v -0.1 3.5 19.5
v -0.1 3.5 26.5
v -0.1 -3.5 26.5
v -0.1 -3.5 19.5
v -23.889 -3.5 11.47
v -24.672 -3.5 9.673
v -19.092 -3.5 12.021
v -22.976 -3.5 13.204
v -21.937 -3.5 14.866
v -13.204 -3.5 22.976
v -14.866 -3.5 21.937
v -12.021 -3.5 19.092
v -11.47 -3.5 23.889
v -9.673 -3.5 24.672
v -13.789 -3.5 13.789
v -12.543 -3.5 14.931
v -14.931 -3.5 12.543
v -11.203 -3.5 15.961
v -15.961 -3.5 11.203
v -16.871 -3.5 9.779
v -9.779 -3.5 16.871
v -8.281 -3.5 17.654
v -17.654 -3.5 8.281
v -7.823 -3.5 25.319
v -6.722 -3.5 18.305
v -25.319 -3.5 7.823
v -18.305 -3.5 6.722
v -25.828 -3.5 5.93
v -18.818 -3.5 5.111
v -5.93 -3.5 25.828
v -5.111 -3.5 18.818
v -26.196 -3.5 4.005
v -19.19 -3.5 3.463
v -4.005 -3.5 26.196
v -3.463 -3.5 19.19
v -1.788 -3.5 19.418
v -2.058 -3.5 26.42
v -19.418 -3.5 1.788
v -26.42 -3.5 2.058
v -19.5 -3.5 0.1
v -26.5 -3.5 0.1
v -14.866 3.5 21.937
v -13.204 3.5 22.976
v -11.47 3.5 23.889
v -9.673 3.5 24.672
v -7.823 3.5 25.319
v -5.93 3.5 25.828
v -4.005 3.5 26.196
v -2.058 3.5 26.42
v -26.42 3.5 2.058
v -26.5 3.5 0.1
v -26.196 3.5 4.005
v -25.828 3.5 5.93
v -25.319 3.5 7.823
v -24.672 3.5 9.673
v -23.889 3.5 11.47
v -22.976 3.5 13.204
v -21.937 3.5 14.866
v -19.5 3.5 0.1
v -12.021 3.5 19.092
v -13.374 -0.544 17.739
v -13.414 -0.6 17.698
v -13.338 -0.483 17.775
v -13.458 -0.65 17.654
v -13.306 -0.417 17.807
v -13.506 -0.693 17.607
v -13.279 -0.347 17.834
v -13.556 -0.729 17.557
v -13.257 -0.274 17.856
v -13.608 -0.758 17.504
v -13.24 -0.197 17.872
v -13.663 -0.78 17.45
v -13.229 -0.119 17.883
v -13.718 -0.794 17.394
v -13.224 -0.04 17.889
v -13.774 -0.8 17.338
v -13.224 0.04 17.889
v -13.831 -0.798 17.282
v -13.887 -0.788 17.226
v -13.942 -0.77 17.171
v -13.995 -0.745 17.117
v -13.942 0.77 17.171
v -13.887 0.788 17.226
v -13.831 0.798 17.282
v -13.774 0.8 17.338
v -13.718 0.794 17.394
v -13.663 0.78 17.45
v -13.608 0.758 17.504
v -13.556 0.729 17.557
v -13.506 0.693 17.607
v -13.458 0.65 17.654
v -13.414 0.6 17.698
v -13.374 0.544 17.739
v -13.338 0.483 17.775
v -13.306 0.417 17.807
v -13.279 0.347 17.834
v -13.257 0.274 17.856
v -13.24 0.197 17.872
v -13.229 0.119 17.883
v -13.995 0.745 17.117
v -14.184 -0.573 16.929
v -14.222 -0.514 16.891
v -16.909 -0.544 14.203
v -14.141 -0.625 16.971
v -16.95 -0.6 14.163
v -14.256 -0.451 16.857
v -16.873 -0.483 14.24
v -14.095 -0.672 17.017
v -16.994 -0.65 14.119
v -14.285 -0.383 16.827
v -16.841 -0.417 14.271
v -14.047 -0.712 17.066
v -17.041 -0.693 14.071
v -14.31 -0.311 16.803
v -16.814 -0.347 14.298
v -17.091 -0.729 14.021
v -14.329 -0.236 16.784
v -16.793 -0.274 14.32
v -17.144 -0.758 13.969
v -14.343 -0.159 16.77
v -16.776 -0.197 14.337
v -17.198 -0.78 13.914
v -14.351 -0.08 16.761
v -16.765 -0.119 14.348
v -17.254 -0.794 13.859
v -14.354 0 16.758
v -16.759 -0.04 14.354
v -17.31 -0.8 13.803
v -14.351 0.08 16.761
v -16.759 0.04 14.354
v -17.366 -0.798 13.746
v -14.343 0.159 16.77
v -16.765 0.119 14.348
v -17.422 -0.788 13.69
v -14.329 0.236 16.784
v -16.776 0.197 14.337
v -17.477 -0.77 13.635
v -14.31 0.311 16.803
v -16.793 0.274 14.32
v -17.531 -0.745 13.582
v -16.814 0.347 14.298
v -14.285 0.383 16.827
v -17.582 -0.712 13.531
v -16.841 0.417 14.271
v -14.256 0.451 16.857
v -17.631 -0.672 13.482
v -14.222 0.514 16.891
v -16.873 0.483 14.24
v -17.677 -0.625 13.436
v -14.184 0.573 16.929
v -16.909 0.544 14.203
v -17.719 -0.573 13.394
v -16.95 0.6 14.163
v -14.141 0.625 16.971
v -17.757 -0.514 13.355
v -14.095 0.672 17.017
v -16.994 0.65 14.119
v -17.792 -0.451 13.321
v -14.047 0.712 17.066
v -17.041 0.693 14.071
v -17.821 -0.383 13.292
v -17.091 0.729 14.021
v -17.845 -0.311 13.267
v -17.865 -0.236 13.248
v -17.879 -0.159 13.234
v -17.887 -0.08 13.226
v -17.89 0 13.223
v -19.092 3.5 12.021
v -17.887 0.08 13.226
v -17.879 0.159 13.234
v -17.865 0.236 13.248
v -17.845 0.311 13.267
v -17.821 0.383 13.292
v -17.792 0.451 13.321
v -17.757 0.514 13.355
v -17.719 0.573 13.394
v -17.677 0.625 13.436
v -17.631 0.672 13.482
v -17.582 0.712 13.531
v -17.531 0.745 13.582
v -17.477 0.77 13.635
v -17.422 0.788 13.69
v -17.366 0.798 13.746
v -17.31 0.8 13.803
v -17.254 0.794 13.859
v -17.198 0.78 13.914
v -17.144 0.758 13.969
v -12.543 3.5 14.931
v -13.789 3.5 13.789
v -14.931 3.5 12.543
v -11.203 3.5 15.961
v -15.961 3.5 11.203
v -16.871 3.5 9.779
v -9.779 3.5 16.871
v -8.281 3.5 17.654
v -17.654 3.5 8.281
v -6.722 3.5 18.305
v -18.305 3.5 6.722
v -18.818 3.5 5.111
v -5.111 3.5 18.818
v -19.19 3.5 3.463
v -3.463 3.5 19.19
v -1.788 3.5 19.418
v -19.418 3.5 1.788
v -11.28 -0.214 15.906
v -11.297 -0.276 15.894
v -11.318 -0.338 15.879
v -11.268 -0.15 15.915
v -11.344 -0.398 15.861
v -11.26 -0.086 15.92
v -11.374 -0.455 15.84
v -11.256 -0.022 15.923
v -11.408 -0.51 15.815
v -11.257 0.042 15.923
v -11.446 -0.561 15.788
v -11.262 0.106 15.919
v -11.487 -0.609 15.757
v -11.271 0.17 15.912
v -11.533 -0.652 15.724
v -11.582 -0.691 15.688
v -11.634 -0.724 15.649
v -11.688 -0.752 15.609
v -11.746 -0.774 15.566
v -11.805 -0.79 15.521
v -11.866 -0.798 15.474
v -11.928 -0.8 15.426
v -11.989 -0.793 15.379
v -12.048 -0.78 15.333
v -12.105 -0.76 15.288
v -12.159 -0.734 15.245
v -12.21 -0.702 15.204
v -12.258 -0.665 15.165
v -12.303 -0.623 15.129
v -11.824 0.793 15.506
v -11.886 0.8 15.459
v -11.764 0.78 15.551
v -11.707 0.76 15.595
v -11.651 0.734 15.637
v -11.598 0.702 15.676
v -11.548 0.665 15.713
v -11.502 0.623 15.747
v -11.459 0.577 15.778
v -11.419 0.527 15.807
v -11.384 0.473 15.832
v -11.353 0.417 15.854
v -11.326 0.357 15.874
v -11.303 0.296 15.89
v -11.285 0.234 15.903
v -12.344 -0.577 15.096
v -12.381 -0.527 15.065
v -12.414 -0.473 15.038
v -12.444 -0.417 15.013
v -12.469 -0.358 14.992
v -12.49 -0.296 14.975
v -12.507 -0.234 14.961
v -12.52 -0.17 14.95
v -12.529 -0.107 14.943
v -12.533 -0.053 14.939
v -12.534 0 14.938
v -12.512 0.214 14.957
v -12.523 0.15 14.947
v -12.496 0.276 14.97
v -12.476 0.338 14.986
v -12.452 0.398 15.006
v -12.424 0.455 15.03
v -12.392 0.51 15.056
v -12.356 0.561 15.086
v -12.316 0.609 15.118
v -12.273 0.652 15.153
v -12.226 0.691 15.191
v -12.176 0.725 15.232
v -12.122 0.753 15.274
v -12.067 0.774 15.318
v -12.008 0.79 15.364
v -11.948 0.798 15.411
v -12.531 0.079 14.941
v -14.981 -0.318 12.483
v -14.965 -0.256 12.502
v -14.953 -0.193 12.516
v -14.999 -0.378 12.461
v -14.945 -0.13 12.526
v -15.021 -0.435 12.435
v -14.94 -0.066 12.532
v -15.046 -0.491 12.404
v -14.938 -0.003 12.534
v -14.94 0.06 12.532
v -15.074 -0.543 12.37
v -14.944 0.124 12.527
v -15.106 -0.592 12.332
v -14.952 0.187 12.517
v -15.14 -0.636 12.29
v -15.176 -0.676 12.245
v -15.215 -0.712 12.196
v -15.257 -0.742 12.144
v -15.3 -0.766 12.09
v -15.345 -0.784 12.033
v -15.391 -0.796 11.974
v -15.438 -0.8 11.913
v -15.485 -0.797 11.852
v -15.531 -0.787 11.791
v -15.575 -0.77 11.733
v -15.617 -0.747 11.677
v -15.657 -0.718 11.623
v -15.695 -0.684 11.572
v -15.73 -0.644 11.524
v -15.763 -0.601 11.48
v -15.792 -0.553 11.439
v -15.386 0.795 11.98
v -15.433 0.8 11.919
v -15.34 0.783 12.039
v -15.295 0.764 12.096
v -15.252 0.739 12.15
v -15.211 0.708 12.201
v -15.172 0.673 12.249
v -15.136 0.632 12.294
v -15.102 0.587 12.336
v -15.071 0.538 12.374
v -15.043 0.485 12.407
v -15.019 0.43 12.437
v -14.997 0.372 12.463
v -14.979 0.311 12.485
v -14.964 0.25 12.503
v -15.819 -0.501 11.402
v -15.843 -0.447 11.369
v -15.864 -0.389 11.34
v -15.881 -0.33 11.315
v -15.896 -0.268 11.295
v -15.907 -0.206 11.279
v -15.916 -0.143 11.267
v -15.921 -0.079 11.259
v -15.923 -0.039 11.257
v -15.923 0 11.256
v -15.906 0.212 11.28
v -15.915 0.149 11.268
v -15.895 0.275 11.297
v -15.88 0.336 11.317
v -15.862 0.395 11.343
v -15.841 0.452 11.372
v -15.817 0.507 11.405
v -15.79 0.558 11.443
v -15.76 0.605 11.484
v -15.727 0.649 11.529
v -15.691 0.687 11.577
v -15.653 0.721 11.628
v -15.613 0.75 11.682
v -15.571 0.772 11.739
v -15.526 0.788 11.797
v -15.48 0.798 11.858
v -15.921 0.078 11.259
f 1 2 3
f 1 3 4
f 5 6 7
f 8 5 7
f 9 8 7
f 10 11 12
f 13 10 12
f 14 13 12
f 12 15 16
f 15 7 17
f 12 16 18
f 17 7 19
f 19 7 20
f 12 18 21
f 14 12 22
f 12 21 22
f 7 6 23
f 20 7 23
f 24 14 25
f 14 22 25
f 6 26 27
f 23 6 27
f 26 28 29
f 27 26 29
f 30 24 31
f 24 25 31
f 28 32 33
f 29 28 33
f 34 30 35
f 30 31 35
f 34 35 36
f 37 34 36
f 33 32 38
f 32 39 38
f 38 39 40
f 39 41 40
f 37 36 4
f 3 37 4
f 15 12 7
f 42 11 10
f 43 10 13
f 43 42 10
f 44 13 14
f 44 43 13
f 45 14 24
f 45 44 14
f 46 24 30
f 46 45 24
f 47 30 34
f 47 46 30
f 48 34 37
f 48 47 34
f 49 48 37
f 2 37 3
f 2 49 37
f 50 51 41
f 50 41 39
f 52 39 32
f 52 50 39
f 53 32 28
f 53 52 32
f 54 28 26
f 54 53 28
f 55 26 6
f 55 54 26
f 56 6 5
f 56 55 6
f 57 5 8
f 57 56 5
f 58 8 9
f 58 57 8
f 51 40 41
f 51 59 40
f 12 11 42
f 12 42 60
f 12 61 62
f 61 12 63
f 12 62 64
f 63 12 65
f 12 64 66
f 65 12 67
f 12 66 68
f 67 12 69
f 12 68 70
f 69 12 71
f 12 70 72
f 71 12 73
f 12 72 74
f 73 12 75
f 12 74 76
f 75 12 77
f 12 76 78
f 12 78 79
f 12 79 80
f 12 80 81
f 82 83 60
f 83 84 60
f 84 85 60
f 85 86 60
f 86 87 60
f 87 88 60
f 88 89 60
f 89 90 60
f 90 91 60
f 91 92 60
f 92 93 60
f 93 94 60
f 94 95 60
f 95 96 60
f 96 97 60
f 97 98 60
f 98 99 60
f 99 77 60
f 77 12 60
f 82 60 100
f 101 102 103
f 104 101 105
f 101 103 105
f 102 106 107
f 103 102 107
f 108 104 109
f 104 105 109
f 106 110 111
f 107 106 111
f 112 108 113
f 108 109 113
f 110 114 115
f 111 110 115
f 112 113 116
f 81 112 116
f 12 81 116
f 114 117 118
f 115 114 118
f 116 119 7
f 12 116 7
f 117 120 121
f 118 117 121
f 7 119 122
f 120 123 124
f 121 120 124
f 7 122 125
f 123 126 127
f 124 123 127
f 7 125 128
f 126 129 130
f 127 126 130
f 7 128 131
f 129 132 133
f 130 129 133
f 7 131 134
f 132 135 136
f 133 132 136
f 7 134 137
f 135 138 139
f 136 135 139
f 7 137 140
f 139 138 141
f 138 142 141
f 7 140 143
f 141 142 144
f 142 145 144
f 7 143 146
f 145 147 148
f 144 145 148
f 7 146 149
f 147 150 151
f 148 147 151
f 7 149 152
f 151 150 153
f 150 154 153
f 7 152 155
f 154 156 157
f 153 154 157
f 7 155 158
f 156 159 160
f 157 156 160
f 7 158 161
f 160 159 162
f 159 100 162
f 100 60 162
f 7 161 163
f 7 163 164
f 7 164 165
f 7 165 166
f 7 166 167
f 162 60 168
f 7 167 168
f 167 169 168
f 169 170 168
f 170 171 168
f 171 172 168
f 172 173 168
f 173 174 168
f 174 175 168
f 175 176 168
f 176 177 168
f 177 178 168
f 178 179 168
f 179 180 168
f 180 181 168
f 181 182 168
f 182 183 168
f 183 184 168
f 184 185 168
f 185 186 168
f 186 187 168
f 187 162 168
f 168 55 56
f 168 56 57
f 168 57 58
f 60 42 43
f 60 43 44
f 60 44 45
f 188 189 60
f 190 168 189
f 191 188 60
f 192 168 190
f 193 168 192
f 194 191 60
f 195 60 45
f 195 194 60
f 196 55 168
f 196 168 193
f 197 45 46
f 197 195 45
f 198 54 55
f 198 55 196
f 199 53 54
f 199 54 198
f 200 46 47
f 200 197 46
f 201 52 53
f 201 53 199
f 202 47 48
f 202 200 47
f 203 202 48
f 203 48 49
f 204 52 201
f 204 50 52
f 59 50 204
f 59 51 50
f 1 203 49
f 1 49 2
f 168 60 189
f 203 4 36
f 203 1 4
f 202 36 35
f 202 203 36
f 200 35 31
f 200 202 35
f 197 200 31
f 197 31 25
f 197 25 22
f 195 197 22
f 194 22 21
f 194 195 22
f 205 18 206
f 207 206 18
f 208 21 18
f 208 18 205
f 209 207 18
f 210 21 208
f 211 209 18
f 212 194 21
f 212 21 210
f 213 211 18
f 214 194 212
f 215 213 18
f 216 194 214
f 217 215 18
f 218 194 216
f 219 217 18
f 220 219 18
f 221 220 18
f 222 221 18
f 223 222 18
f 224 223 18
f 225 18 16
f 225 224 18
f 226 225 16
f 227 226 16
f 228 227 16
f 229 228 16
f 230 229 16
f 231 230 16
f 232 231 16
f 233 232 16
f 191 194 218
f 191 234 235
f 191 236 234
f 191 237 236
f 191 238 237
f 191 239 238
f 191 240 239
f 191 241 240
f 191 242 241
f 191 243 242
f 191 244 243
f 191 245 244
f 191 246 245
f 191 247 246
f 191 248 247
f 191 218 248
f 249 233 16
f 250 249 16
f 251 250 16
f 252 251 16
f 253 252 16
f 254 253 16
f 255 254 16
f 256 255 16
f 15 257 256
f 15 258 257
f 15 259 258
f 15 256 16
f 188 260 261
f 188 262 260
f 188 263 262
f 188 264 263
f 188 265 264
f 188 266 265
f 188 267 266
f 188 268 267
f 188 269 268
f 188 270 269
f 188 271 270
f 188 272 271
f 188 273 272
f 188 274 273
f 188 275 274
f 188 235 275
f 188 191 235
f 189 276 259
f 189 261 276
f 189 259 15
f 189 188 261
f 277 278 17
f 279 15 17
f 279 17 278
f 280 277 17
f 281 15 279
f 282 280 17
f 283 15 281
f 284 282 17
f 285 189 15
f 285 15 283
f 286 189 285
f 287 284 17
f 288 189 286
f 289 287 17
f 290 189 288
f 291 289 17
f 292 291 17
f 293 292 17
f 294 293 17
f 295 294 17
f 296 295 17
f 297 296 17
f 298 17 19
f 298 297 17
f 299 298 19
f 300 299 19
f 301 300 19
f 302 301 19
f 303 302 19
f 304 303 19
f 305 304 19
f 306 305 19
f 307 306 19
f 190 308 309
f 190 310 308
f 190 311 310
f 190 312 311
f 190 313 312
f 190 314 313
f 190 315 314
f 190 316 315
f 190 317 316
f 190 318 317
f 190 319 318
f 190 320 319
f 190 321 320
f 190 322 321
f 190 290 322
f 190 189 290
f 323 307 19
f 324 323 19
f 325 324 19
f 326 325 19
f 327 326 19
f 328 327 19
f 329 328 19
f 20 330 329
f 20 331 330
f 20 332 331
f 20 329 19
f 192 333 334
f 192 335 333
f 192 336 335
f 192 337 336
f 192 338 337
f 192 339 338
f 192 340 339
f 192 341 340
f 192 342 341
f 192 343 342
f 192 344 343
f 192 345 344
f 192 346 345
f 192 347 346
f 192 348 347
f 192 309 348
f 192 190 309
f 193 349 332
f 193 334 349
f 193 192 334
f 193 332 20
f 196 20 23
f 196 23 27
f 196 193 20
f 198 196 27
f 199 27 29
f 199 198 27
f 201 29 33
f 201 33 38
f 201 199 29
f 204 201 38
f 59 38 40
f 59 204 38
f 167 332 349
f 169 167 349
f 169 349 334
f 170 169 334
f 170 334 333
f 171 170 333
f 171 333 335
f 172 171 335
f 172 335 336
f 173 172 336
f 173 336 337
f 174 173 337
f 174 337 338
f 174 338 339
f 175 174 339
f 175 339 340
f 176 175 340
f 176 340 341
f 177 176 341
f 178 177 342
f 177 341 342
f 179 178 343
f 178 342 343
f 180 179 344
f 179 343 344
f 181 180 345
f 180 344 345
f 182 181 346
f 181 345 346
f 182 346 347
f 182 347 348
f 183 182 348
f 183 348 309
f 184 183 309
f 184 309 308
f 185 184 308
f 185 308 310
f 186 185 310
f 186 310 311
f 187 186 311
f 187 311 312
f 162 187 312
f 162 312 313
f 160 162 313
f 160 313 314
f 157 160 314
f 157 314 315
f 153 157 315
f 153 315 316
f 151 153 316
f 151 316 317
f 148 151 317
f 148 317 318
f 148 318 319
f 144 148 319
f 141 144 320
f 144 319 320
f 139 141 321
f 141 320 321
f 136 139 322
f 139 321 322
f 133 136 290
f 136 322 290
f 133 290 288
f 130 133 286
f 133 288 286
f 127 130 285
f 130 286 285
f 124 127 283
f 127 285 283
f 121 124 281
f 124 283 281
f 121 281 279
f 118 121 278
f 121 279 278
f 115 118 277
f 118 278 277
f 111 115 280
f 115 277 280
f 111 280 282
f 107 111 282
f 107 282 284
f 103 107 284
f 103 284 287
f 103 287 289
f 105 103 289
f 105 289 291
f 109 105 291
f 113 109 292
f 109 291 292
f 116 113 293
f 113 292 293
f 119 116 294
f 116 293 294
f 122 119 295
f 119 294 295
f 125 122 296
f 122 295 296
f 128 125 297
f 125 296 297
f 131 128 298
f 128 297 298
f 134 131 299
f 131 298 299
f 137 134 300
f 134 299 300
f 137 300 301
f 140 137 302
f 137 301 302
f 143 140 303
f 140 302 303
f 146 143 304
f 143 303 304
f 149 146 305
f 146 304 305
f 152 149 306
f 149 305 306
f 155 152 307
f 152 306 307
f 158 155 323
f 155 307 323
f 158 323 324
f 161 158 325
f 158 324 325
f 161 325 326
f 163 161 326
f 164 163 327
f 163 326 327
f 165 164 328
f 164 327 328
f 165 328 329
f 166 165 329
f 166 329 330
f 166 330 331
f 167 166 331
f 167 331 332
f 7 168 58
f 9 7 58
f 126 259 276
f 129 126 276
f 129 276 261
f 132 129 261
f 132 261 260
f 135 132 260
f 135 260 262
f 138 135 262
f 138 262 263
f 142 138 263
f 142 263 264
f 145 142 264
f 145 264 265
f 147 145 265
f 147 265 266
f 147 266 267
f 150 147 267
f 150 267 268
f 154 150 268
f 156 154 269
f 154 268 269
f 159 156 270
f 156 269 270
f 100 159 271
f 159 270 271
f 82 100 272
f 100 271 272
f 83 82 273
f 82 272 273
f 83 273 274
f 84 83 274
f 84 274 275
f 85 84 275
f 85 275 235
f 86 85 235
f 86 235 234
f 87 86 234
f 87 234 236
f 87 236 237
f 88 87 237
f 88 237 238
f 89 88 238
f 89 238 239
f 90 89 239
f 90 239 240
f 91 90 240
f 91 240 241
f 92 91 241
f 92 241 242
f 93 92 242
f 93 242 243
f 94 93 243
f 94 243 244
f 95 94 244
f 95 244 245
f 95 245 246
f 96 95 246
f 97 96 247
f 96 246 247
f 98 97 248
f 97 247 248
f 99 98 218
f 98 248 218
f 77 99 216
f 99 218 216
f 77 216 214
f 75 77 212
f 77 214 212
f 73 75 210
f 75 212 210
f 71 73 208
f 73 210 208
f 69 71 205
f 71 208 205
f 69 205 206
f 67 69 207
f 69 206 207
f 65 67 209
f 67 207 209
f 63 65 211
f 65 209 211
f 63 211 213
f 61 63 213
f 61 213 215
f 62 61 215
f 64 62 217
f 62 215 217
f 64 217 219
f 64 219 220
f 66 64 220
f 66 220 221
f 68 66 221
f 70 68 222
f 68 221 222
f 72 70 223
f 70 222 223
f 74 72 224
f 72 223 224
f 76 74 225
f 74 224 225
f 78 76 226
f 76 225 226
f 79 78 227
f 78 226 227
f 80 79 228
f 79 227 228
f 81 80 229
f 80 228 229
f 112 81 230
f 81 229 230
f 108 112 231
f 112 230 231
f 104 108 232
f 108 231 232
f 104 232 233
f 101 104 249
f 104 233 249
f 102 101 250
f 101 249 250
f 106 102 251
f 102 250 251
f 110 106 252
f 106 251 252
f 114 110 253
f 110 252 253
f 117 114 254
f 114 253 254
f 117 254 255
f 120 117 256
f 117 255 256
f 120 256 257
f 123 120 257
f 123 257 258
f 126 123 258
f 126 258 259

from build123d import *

# Parameters (mm, degrees)
BOSS_EXTRUDE1_DEPTH                   = 3.5
CUT_EXTRUDE1_DEPTH                    = 39.124532784
TAP_DRILL_FOR_M2X0_4_TAP1_D           = 1.6
TAP_DRILL_FOR_M2X0_4_TAP1_ON_FACE_2_D = 1.6


with BuildPart() as part:
    # Sketch1 → Boss-Extrude1 (new, symmetric)
    with BuildSketch(Plane(origin=(0, 0, 0), x_dir=(1, 0, 0), z_dir=(0, 1, 0))):
        with BuildLine():
            Line((-19.499743588, -0.1), (-26.49981132, -0.1))
            ThreePointArc((-26.49981132, -0.1), (-18.738329701, -18.738329701), (-0.1, -26.49981132))
            Line((-0.1, -26.49981132), (-0.1, -19.499743588))
            ThreePointArc((-0.1, -19.499743588), (-13.788582233, -13.788582233), (-19.499743588, -0.1))
        make_face()
    extrude(amount=BOSS_EXTRUDE1_DEPTH, both=True)

    # Sketch2 → Cut-Extrude1 (cut, through all)
    with BuildSketch(Plane(origin=(0, 3.5, 0), x_dir=(1, 0, 0), z_dir=(0, 1, 0))):
        Polygon((-22.273863607, -15.202795796), (-15.202795796, -22.273863607), (-12.02081528, -19.091883092), (-19.091883092, -12.02081528), align=None)
    extrude(amount=-CUT_EXTRUDE1_DEPTH, mode=Mode.SUBTRACT)

    # Tap Drill for M2x0.4 Tap1 (through all)
    with Locations(Plane(origin=(-17.324116139, 0, 13.788582233), x_dir=(0.707106781187, 0, 0.707106781187), z_dir=(-0.707106781187, 0, 0.707106781187))):
        with Locations((0, 0)):
            Hole(TAP_DRILL_FOR_M2X0_4_TAP1_D / 2)

    # Tap Drill for M2x0.4 Tap1 on face 2 (through all)
    with Locations(Plane(origin=(-13.788582233, 0, 17.324116139), x_dir=(0.707106781187, 0, 0.707106781187), z_dir=(-0.707106781187, 0, 0.707106781187))):
        with Locations((0, 0)):
            Hole(TAP_DRILL_FOR_M2X0_4_TAP1_ON_FACE_2_D / 2)


solid = part.part
